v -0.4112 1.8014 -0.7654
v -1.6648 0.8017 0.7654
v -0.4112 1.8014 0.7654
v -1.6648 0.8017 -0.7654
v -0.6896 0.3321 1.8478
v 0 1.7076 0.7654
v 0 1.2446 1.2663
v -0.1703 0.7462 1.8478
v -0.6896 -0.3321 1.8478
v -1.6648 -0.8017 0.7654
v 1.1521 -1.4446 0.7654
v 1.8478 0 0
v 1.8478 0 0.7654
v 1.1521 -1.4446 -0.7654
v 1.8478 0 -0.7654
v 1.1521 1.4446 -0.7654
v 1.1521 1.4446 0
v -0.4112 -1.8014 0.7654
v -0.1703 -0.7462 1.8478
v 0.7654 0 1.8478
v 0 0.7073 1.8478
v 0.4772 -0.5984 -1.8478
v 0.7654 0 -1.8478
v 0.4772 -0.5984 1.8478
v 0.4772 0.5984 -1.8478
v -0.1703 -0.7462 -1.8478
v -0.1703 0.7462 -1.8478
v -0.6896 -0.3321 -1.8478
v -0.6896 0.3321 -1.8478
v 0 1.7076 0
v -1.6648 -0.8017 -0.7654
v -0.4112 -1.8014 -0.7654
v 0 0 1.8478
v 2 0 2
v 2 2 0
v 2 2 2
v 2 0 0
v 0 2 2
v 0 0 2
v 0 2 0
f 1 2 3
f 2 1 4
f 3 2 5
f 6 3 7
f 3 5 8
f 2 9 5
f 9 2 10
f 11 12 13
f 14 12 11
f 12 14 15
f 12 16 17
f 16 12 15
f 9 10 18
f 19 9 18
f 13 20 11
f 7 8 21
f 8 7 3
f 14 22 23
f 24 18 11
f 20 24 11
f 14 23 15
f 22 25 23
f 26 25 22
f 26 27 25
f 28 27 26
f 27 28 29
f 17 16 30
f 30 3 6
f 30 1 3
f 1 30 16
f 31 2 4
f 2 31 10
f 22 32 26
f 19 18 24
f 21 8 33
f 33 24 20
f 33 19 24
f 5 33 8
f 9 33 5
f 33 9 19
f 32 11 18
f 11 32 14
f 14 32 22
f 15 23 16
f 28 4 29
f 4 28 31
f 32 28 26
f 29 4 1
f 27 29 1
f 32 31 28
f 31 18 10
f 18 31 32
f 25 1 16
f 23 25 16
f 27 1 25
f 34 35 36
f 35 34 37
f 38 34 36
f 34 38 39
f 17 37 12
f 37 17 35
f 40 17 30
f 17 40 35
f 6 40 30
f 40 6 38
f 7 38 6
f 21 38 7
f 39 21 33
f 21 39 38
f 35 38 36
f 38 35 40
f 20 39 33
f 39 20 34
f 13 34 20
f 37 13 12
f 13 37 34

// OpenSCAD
foo(x=1);
z=1;

function f1(x) = x+1;

module foo(x) {
    bar(y=2);
    echo("cube", sz=sz, x=x);
    cube(sz);
}

module bar(y=2) {
    echo("sphere",y=y,z=f1(z));
    sphere(y);
}

baz();

module bar(y=3) {
    echo("sphere",y=y,z=z);
    sphere(y);
}

module baz() {
    echo("baz", x=f1(1));
    function f1(x) = x+2;

    function f1(x) = x+3;
}

z = 4;
sz = 2;
y=3;
